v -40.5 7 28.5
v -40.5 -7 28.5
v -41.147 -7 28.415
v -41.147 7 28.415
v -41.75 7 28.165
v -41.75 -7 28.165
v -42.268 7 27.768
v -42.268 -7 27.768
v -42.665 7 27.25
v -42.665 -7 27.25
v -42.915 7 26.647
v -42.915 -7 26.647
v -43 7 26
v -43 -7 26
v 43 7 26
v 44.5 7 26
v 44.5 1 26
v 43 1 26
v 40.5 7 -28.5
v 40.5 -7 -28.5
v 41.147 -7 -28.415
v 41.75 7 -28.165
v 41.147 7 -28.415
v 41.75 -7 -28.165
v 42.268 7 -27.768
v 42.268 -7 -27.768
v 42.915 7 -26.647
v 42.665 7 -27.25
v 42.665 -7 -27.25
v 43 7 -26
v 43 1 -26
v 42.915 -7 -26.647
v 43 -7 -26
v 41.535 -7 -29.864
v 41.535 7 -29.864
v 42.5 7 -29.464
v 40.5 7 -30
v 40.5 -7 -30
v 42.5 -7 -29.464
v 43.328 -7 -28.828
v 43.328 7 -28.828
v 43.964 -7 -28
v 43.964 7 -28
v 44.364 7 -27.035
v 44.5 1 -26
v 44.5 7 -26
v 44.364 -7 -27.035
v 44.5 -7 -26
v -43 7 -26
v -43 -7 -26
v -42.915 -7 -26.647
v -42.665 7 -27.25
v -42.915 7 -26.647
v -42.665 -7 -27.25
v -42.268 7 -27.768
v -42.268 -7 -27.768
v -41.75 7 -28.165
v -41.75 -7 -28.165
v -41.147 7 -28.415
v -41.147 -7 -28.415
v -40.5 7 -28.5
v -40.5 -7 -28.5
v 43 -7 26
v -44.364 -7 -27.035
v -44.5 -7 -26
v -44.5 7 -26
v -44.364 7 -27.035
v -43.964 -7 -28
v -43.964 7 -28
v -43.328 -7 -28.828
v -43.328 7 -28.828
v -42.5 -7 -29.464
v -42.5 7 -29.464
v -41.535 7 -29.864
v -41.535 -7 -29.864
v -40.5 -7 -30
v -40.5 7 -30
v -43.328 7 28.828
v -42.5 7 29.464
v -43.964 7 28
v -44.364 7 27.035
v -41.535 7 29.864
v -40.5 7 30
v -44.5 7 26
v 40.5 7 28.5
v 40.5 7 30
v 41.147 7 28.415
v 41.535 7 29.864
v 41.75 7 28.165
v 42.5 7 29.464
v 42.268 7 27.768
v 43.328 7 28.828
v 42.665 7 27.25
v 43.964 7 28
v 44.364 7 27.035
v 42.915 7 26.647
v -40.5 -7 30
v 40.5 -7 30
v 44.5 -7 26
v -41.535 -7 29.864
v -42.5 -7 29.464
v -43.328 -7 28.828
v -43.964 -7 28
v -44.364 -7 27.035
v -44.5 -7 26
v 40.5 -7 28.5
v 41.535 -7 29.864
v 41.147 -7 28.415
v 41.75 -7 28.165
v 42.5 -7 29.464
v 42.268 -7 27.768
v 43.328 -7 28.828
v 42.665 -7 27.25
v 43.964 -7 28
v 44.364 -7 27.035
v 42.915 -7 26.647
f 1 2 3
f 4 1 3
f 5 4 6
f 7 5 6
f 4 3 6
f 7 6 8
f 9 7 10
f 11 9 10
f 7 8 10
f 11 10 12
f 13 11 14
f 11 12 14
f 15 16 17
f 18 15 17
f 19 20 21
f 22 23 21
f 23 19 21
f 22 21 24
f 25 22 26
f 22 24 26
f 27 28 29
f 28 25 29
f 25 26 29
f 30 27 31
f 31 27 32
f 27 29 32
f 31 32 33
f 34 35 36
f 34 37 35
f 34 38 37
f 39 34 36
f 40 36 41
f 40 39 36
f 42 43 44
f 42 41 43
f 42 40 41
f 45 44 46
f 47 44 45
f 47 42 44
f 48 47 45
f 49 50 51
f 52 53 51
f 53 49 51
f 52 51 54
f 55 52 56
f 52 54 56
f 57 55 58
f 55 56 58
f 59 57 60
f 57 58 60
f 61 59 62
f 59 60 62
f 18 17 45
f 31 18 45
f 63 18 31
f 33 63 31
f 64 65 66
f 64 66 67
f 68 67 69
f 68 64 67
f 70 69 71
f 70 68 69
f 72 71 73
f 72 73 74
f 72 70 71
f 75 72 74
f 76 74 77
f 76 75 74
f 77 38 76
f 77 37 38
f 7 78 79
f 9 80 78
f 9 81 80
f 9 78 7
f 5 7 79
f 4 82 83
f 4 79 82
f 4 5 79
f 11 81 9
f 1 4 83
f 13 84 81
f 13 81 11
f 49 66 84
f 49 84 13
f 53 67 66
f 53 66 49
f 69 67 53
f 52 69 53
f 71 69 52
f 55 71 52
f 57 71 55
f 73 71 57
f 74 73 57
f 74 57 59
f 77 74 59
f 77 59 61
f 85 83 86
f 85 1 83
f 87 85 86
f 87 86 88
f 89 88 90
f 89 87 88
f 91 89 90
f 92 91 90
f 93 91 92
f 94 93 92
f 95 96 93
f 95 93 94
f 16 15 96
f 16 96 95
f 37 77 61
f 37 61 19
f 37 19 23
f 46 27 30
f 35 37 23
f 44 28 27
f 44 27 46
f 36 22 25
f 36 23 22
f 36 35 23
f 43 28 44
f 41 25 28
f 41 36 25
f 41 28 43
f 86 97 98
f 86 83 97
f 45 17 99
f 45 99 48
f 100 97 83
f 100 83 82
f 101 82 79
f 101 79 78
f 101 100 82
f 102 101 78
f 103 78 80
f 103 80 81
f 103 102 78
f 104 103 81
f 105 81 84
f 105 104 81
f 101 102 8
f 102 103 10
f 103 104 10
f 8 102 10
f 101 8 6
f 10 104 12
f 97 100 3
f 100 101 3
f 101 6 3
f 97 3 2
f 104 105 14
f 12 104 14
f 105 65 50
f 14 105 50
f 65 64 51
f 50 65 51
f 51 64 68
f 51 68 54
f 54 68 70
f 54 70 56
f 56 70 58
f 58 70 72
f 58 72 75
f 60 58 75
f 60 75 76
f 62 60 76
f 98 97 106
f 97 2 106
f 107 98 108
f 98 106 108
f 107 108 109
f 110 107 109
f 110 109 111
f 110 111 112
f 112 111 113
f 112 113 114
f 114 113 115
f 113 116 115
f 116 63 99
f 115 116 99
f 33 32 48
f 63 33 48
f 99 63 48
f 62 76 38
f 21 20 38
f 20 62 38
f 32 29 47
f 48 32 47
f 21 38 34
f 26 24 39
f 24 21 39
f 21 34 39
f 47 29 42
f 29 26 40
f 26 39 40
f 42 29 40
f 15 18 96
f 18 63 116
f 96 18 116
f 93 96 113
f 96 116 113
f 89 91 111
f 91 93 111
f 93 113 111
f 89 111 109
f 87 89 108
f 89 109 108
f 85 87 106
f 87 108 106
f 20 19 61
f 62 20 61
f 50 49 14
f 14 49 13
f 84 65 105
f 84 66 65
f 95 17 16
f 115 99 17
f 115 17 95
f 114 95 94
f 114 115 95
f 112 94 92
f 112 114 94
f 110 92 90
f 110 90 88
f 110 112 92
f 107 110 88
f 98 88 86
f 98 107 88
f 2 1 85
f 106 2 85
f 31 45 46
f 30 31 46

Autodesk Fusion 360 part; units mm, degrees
sketch "sketch 234" plane through (0, 0, 0) normal (0, 1, 0) x (1, 0, 0)
  line L0 (-43, -28.5) -> (43, -28.5)
  line L1 (43, -28.5) -> (43, 28.5)
  line L2 (43, 28.5) -> (-43, 28.5)
  line L3 (-43, 28.5) -> (-43, -28.5)
  line L4 (0, -28.5) -> (0, 0) construction
  line L5 (0, 0) -> (43, 0) construction
  circle A0 centre (-39, -24.5) radius 1.5
  circle A1 centre (-15, -15) radius 1.5
  line L6 (-15, -15) -> (15, -15) construction
  circle A2 centre (15, -15) radius 1.5
  line L7 (-15, -15) -> (-15, 15) construction
  circle A3 centre (-15, 15) radius 1.5
  line L8 (15, -15) -> (15, 15) construction
  line L9 (15, 15) -> (-15, 15) construction
  circle A4 centre (15, 15) radius 1.5
  line L10 (0, 15) -> (0, 0) construction
  line L11 (-15, 0) -> (0, 0) construction
  line L12 (44.5, 30) -> (-44.5, 30)
  line L13 (-44.5, 30) -> (-44.5, -30)
  line L14 (-44.5, -30) -> (44.5, -30)
  line L15 (44.5, -30) -> (44.5, 30)
  dimension "d6" = 86
  dimension "d7" = 57
  dimension "d8" = 3
  dimension "d9" = 4
  dimension "d10" = 4
  dimension "d11" = 3
  dimension "d12" = 3
  dimension "d13" = 30
  dimension "d14" = 30
  dimension "d15" = 3
  dimension "d16" = 3
  dimension "d33" = 0
  dimension "d34" = 0
  dimension "d35" = 0
  dimension "d36" = 0
  dimension "d79" = 0
  dimension "d80" = 0
  dimension "d81" = 0
  dimension "d82" = 0
  dimension "d97" = 1.5
extrude "Extrude1" add sketch "sketch 234" against normal blind 14 from surface at 7 contours L12 L13 L14 L15
fillet "Fillet2" radius 2.5 4 edges at (43, 0, 28.5) (43, 0, -28.5) (-43, 0, 28.5) (-43, 0, -28.5)
fillet "Fillet2" radius 4 4 edges at (-44.5, 0, -30) (-44.5, 0, 30) (44.5, 0, 30) (44.5, 0, -30)
sketch "sketch 592" plane through (44.5, 0, 0) normal (1, 0, 0) x (0, 1, 0)
  line L0 (7, 26) -> (7, -26)
  line L1 (7, 26) -> (1, 26)
  line L2 (1, 26) -> (1, -26)
  line L3 (1, -26) -> (7, -26)
  dimension "d122" = 6
extrude "Extrude4" cut sketch "sketch 592" against normal blind 3
equation "d6 = boxWidth"
equation "d7 = boxHeight"
equation "d97 = thickness"
equation "d138 = boxWidth + ( thickness * 2 )"
equation "d139 = boxHeight + ( thickness * 2 )"
equation "d175 = thickness"
equation "d200 = boxHeight / 2"
